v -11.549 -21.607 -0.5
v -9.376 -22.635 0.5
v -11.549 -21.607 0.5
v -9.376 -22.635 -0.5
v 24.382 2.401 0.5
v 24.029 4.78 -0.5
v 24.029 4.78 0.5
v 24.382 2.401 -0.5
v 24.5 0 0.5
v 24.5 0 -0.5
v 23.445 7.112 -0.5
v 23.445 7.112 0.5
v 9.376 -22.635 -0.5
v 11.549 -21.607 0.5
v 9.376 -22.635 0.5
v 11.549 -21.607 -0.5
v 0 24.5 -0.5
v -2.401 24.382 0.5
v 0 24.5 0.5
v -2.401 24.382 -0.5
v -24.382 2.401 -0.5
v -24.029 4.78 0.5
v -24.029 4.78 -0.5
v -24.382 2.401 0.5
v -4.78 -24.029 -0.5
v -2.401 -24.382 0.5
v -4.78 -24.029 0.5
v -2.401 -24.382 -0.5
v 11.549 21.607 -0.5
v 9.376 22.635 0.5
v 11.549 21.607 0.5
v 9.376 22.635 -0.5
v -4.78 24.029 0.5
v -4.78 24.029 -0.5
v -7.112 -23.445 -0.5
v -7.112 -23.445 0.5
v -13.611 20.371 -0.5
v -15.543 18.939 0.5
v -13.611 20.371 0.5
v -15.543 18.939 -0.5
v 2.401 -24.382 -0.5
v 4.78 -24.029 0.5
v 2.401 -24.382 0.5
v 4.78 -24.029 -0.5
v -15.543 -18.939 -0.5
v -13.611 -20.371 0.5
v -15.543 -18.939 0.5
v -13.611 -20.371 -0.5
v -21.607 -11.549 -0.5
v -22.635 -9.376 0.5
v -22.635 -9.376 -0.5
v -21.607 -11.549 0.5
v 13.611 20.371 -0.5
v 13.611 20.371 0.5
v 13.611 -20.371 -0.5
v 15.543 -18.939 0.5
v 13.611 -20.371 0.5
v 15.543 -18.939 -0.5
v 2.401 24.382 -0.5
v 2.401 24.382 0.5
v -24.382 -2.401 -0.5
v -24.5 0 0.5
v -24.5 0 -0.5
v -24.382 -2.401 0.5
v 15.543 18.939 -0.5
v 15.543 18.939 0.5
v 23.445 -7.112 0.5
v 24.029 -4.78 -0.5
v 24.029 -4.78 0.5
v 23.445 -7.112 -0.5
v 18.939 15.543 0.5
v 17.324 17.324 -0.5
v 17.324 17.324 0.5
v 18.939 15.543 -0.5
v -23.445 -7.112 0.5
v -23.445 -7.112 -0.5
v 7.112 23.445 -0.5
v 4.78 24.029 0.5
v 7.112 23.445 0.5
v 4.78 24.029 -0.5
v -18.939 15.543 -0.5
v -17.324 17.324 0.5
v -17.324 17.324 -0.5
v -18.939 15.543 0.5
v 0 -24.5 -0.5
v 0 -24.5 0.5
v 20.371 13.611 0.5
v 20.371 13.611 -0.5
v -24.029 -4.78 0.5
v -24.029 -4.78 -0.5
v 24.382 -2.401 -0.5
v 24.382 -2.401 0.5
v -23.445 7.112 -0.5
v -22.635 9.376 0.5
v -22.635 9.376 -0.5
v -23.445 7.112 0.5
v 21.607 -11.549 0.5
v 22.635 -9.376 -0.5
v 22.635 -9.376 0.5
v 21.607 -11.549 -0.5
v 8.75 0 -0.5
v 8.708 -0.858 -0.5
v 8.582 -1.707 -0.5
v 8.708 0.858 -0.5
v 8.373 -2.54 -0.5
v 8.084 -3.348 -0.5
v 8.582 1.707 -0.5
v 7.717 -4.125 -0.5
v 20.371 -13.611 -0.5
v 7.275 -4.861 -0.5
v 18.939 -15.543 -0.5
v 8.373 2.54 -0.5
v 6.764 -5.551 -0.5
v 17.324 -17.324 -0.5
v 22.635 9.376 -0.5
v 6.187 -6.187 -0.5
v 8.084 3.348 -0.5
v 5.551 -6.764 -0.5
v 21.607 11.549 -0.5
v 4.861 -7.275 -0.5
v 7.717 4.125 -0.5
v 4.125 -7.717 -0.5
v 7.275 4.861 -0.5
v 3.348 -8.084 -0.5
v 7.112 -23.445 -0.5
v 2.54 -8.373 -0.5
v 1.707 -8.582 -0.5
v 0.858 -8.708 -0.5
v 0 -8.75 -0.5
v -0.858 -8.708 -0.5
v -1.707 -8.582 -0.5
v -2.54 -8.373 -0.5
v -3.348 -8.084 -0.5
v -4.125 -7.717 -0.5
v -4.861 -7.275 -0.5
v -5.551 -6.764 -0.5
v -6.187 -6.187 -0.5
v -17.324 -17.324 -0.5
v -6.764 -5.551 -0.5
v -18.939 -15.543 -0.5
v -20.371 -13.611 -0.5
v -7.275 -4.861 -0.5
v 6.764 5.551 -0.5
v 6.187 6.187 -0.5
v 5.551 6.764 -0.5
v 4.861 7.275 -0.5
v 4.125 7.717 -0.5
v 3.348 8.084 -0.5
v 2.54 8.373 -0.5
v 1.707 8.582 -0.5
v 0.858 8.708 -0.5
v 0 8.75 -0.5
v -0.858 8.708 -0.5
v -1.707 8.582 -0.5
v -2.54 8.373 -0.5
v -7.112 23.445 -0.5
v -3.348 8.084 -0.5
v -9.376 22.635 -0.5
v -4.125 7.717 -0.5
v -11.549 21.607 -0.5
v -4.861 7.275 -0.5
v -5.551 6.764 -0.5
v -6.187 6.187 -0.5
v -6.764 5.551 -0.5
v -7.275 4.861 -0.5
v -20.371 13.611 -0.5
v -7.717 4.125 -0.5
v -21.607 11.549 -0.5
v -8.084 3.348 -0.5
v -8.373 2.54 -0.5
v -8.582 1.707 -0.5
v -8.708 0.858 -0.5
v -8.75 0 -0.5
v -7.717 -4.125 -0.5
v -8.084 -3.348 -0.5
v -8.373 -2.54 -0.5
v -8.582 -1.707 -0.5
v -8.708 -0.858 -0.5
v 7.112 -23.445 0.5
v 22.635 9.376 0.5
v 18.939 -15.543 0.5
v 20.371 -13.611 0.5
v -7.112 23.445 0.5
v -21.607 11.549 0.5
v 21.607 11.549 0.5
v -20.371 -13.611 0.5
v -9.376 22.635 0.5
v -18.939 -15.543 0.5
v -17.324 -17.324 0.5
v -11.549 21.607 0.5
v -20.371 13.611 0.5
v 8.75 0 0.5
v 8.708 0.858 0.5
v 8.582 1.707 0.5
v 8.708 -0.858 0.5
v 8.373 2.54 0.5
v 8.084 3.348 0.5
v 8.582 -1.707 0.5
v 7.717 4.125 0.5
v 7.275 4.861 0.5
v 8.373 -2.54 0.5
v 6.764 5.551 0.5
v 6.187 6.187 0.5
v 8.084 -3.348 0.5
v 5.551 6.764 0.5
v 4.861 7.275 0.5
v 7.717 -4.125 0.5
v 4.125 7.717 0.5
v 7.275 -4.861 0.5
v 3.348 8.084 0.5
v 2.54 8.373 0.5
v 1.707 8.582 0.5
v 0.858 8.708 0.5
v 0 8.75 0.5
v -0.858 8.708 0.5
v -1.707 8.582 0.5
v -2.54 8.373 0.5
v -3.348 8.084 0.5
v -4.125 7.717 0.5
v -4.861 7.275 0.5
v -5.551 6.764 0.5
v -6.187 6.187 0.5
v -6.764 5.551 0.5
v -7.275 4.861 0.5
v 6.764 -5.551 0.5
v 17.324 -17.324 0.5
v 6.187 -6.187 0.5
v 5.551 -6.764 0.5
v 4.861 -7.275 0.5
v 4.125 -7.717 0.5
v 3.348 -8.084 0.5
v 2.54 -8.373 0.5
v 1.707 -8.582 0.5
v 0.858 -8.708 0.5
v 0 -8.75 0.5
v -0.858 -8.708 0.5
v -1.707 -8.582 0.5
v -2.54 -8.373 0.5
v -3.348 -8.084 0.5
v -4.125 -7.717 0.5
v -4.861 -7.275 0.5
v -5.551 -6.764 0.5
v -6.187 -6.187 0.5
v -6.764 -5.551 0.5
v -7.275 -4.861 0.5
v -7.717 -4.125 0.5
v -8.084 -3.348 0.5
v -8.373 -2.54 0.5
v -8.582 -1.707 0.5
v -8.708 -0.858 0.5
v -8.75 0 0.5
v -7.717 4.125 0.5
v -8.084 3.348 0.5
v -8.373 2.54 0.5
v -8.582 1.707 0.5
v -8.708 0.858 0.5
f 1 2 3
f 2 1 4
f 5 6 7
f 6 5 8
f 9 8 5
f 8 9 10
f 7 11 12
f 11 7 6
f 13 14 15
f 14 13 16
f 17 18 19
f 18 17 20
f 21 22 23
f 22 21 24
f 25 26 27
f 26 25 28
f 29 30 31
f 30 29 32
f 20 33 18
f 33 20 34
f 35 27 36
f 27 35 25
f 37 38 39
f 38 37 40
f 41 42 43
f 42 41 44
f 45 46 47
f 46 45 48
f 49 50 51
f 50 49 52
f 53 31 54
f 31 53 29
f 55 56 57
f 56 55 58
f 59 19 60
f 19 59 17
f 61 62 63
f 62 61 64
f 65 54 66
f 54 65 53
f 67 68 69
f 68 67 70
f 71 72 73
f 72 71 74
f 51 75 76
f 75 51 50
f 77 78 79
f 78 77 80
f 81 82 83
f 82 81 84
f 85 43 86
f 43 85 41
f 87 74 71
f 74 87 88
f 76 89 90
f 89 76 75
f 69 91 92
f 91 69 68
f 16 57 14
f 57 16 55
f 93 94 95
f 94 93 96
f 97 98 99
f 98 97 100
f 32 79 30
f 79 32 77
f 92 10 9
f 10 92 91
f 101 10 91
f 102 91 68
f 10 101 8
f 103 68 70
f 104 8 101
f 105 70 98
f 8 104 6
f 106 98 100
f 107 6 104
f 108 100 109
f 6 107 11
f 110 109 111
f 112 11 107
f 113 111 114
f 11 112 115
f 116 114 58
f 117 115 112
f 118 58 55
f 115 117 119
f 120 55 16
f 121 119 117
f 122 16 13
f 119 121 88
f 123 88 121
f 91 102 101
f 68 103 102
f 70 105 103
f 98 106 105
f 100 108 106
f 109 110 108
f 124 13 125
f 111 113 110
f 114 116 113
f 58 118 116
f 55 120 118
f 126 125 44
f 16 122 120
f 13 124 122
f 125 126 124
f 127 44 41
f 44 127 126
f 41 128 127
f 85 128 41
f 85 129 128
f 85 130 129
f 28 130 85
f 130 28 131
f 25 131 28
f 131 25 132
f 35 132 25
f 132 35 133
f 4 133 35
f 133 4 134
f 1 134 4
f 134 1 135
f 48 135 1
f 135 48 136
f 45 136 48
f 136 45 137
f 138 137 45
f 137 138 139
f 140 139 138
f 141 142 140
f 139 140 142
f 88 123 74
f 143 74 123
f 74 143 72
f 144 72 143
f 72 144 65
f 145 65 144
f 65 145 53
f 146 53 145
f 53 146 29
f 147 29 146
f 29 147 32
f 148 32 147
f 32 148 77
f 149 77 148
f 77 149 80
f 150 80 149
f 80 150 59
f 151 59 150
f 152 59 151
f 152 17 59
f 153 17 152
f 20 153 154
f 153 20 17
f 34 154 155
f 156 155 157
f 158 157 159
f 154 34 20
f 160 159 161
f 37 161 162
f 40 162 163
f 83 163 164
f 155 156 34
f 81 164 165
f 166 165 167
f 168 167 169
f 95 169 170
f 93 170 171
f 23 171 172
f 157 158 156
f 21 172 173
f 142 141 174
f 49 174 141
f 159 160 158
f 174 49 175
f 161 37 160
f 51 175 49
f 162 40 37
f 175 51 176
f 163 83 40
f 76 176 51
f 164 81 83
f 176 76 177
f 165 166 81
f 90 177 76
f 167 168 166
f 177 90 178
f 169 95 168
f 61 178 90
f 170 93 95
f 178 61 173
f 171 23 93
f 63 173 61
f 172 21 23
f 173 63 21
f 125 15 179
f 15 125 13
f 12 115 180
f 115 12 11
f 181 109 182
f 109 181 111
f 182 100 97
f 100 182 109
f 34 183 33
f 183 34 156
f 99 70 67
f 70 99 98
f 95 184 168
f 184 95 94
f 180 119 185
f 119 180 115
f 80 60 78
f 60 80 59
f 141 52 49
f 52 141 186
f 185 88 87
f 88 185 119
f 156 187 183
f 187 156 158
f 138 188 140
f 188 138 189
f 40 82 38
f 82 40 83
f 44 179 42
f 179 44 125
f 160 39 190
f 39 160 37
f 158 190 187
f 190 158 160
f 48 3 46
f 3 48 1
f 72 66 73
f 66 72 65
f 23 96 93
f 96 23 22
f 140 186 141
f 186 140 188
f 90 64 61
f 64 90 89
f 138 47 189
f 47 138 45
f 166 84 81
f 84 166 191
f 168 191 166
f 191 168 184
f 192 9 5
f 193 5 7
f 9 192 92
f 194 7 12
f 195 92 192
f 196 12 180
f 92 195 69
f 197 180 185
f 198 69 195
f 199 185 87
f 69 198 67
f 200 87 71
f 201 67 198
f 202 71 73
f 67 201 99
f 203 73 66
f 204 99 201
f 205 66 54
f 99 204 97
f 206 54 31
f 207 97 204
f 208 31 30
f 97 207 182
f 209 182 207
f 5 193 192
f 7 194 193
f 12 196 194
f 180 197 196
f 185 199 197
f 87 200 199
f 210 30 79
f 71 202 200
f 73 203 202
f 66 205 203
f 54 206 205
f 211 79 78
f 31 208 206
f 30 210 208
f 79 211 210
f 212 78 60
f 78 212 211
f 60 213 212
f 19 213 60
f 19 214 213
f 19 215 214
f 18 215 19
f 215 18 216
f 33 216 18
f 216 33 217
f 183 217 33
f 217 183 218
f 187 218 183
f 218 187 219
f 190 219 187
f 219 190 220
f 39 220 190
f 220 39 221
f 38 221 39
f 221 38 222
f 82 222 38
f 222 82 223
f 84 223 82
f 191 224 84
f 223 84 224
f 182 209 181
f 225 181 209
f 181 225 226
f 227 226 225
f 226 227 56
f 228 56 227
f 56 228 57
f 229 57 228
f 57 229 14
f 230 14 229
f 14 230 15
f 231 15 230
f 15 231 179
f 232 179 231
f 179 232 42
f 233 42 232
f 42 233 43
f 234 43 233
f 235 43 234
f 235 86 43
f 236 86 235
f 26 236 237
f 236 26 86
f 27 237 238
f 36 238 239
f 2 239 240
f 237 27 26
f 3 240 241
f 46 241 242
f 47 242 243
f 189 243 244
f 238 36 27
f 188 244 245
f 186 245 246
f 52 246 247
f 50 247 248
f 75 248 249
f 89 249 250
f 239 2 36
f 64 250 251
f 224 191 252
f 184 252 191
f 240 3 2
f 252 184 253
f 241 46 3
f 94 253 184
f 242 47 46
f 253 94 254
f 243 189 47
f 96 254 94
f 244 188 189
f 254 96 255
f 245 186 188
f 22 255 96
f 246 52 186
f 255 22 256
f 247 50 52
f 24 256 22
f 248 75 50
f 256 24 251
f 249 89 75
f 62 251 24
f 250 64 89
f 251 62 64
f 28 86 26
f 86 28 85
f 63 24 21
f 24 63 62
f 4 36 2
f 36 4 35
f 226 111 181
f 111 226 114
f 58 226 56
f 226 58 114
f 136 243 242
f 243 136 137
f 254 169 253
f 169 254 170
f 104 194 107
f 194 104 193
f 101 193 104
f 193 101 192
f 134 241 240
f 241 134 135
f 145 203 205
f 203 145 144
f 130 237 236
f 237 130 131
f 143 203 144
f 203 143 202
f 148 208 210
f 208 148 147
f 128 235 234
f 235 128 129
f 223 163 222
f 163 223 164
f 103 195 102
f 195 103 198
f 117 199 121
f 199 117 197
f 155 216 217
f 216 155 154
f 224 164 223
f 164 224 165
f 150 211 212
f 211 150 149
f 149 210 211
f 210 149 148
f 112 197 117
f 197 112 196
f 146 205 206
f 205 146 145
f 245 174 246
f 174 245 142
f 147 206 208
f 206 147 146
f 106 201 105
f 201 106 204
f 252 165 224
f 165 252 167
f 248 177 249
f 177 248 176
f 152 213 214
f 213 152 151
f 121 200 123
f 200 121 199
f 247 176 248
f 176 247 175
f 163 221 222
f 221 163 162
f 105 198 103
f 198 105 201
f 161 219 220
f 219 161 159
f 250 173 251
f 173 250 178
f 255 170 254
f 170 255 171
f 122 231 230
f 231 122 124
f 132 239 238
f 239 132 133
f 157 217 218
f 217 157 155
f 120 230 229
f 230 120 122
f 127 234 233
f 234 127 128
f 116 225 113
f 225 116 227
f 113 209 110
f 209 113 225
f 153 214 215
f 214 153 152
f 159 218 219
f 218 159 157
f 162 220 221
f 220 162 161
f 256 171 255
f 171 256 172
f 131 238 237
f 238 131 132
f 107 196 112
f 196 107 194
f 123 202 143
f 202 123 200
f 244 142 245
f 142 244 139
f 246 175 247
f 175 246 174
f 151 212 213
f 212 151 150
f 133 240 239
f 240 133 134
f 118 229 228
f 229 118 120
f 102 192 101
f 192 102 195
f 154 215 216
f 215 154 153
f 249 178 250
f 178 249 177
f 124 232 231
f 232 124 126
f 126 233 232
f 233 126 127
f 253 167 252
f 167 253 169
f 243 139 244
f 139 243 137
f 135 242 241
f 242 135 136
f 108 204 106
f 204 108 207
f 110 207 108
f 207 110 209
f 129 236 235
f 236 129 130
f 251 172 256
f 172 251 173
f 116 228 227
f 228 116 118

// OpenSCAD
// file: ToyShapes.scad
// use <MCAD/regular_shapes.scad>

module lineup(num, xspace, yspace, zspace) {
  for (i = [0 : num-1])
    translate([ xspace*i, yspace*i, zspace*i ]) child(0);
}

module rounded(radius)
{
	difference()
	{
		cube([radius*2,radius*2,500], center=true);
		translate([radius,radius,0])
			cylinder(r=radius,h=501,center=true, $fn=25);
	}
}

module pole_shape(height)
{
	cylinder(r=7.5,h=height,center=true);
}

module pole(height)
{
	translate([0,0,height/2])
	difference() {
		union() {
			pole_shape(height);
			translate([0,0,height/2])
				sphere(r=7.5,center=true);
		}
		translate([0,0,-height/2])
			cube([30,2,12],center=true);
	}
}

module toy1_shape()
{
	cylinder(r=24.5,h=1,center=true);
}

module toy2_shape()
{
	cube([33,49,15],center=true);
}

module toy3_shape()
{
	linear_extrude(height=15,center=true,convexity=0,twist=0) {
		circle(r=34, $fn=3);
	}
}

module toy4_shape()
{
	cube([49,49,15],center=true);	
}

module toy5_shape()
{
	cylinder(r=27,h=15,$fn=5,center=true);
}

module hole()
{
	cylinder(r=8.75,h=20,center=true);
}

module toy1_with_hole()
{
	difference()
	{
		toy1_shape();
		hole();
	}	
}

module toy2_with_hole()
{
	difference()
	{
		toy2_shape();
		hole();
	}	
}

module toy3_with_hole()
{
	difference()
	{
		toy3_shape();
		hole();
	}
}

module toy4_with_hole()
{
	difference()
	{
		toy4_shape();
		hole();
	}
}

module toy5_with_hole()
{
	difference()
	{
		toy5_shape();
		hole();
	}
}

module toy1()
{
	toy1_with_hole();
}

module toy2()
{
	rotate([0,0,45])
	difference()
	{
		rotate([0,0,45])
			toy2_with_hole();
		
		translate([00, -35, 0])
			rotate([0,0,45])
				translate([8,0,0])
					rounded(4);

		rotate([0,0,90])
			translate([0, -35, 0])
				rotate([0,0,45])
					translate([0,8,0])
						rounded(4);
		
		rotate([0,0,180])
			translate([0, -35, 0])
				rotate([0,0,45])
					translate([8,0,0])
						rounded(4);

		rotate([0,0,270])
			translate([0, -35, 0])
				rotate([0,0,45])
					translate([0,8,0])
						rounded(4);
	}
}

module toy3()
{
	difference()
	{
		rotate([0,0,30])
			toy3_with_hole();

		translate([0, -33.3, 0])
			rotate([0,0,45])
				rounded(2);

		rotate([0,0,120])
			translate([0, -33.3, 0])
				rotate([0,0,45])
					rounded(2);

		rotate([0,0,240])
			translate([0, -33.3, 0])
				rotate([0,0,45])
					rounded(2);
	}
}

module toy4()
{
	rotate([0,0,45])
	difference()
	{
		rotate([0,0,45])
			toy4_with_hole();
		
		translate([0, -35, 0])
			rotate([0,0,45])
				rounded(4);

		rotate([0,0,90])
			translate([0, -35, 0])
				rotate([0,0,45])
					rounded(4);
		
		rotate([0,0,180])
			translate([0, -35, 0])
				rotate([0,0,45])
					rounded(4);

		rotate([0,0,270])
			translate([0, -35, 0])
				rotate([0,0,45])
					rounded(4);
	}
}

module toy5()
{
	difference() {
		rotate([0,0,18])
			toy5_with_hole();

		translate([0, 28, 0])
			rotate([0,0,225])
				rounded(4);
		
		rotate([0,0,72.5])
			translate([0, 28, 0])
				rotate([0,0,225])
					rounded(4);

		rotate([0,0,144])
			translate([0, 28, 0])
				rotate([0,0,225])
					rounded(4);

		rotate([0,0,216])
			translate([0, 28, 0])
				rotate([0,0,225])
					rounded(4);

		rotate([0,0,288])
			translate([0, 28, 0])
				rotate([0,0,225])
					rounded(4);
	}
}

module base_solid()
{
	difference()
	{
		// Big base board
		cube([330,55,17],center=true);
		
		// Hollow out the holes for the poles
		translate([0,0,5]) {
			translate([-140,0,0])			
				cylinder(r=7.5,h=20,center=true);
			translate([-70,0,0])			
				cylinder(r=7.5,h=20,center=true);
			translate([0,8,0])			
				cylinder(r=7.5,h=20,center=true);
			translate([70,0,0])			
				cylinder(r=7.5,h=20,center=true);
			translate([140,0,0])			
				cylinder(r=7.5,h=20,center=true);
		}

		// Round the 4 corners
		translate([-166,-28,0])
			rotate([0,0,0])
				rounded(5);
		translate([-166,28,0])
			rotate([0,0,270])
				rounded(5);
		translate([166,28,0])
			rotate([0,0,180])
				rounded(5);
		translate([166,-28,0])
			rotate([0,0,90])
				rounded(5);
	}
}

module base_half(top)
{
	extended = 50;
	translate([0,0,top*(8.5)+sign(top)*(extended/2)])
		cube([340,65,17+extended],center=true);
}

module joint(x,y,z,x2,y2,z2,top,mirr)
{
	l = 500;
	union()
	{
		difference()
		{
			// Chop the base in to two
			intersection()
			{
				child(0);
				translate([x-(mirr*l/2),y,z])
					cube([l,l,l],center=true);
			}

			intersection()
			{	
				child(0);
				translate([x+(mirr*x2),y+y2,z+z2])
					child(1);
				translate([x,y,z-(top*l/2)])
					cube([l,l,l],center=true);
			}
		}
		intersection()
		{	
			child(0);
			translate([x-(mirr*x2),y-y2,z-z2])
				child(1);
			translate([x,y,z+(top*l/2)])
				cube([l,l,l],center=true);
		}
	}
}

module joint_volume()
{
	difference()
	{
		rotate([0,0,45])
			cube([28,28,100],center=true);
		rotate([0,0,0])
			translate([0,-20,0])
				rotate([0,0,45])
					rounded(5);
		rotate([0,0,90])
			translate([0,-20,0])
				rotate([0,0,45])
					rounded(5);
		rotate([0,0,180])
			translate([0,-20,0])
				rotate([0,0,45])
					rounded(5);
		rotate([0,0,270])
			translate([0,-20,0])
				rotate([0,0,45])
					rounded(5);
	}
}

module base()
{
	chop_inner = 35;
	chop_outer = 105;

	// Left-end
	joint(-chop_outer,0,0, -5,0,0, 1,1)
	{
		base_solid();
		joint_volume();
	}

	// Left-middle
	translate([0,0,-40])
	union()
	{
		intersection()
		{
			joint(-chop_inner,0,0, -5,0,0, 1,1)
			{
				base_solid();
				joint_volume();
			}
			translate([250-70,0,0])
				cube([500,500,500],center=true);
		}

		difference()
		{
			joint(-chop_outer,0,0, -5,0,0, -1,-1)
			{
				base_solid();
				joint_volume();
			}
			translate([250-70,0,0])
				cube([500,500,500],center=true);
		}		
	}

	// // Middle (joints on both left and right-hand sides, bottom extending out)
	translate([0,0,-80])
	union()
	{
		difference()
		{
			joint(chop_inner,0,0, -5,0,0, -1,1)
			{
				base_solid();
				joint_volume();
			}
			translate([-250,0,0])
				cube([500,500,500],center=true);
		}

		translate([0.0001,0,0]) // Make sure this is a 2-manifold object for STL export
		{
			difference()
			{
				joint(-chop_inner,0,0, -5,0,0, -1,-1)
				{
					base_solid();
					joint_volume();
				}
				translate([250,0,0])
					cube([500,500,500],center=true);
			}
		}
	}

	// // Right-middle
	translate([0,0,-40])
	union()
	{
		intersection()
		{
			joint(chop_inner,0,0, -5,0,0, 1,-1)
			{
				base_solid();
				joint_volume();
			}
			translate([-250+70,0,0])
				cube([500,500,500],center=true);
		}

		difference()
		{
			joint(chop_outer,0,0, -5,0,0, -1,1)
			{
				base_solid();
				joint_volume();
			}
			translate([-250+70,0,0])
				cube([500,500,500],center=true);
		}		
	}

	// // Right-end
	joint(chop_outer,0,0, -5,0,0, 1,-1)
	{
		base_solid();
		joint_volume();
	}
}
// main file
use <ToyShapes.scad>

// r=22.5;
// cylinder(r1=r+5,r2=r,h=5);

$fn=64;
toy1();
